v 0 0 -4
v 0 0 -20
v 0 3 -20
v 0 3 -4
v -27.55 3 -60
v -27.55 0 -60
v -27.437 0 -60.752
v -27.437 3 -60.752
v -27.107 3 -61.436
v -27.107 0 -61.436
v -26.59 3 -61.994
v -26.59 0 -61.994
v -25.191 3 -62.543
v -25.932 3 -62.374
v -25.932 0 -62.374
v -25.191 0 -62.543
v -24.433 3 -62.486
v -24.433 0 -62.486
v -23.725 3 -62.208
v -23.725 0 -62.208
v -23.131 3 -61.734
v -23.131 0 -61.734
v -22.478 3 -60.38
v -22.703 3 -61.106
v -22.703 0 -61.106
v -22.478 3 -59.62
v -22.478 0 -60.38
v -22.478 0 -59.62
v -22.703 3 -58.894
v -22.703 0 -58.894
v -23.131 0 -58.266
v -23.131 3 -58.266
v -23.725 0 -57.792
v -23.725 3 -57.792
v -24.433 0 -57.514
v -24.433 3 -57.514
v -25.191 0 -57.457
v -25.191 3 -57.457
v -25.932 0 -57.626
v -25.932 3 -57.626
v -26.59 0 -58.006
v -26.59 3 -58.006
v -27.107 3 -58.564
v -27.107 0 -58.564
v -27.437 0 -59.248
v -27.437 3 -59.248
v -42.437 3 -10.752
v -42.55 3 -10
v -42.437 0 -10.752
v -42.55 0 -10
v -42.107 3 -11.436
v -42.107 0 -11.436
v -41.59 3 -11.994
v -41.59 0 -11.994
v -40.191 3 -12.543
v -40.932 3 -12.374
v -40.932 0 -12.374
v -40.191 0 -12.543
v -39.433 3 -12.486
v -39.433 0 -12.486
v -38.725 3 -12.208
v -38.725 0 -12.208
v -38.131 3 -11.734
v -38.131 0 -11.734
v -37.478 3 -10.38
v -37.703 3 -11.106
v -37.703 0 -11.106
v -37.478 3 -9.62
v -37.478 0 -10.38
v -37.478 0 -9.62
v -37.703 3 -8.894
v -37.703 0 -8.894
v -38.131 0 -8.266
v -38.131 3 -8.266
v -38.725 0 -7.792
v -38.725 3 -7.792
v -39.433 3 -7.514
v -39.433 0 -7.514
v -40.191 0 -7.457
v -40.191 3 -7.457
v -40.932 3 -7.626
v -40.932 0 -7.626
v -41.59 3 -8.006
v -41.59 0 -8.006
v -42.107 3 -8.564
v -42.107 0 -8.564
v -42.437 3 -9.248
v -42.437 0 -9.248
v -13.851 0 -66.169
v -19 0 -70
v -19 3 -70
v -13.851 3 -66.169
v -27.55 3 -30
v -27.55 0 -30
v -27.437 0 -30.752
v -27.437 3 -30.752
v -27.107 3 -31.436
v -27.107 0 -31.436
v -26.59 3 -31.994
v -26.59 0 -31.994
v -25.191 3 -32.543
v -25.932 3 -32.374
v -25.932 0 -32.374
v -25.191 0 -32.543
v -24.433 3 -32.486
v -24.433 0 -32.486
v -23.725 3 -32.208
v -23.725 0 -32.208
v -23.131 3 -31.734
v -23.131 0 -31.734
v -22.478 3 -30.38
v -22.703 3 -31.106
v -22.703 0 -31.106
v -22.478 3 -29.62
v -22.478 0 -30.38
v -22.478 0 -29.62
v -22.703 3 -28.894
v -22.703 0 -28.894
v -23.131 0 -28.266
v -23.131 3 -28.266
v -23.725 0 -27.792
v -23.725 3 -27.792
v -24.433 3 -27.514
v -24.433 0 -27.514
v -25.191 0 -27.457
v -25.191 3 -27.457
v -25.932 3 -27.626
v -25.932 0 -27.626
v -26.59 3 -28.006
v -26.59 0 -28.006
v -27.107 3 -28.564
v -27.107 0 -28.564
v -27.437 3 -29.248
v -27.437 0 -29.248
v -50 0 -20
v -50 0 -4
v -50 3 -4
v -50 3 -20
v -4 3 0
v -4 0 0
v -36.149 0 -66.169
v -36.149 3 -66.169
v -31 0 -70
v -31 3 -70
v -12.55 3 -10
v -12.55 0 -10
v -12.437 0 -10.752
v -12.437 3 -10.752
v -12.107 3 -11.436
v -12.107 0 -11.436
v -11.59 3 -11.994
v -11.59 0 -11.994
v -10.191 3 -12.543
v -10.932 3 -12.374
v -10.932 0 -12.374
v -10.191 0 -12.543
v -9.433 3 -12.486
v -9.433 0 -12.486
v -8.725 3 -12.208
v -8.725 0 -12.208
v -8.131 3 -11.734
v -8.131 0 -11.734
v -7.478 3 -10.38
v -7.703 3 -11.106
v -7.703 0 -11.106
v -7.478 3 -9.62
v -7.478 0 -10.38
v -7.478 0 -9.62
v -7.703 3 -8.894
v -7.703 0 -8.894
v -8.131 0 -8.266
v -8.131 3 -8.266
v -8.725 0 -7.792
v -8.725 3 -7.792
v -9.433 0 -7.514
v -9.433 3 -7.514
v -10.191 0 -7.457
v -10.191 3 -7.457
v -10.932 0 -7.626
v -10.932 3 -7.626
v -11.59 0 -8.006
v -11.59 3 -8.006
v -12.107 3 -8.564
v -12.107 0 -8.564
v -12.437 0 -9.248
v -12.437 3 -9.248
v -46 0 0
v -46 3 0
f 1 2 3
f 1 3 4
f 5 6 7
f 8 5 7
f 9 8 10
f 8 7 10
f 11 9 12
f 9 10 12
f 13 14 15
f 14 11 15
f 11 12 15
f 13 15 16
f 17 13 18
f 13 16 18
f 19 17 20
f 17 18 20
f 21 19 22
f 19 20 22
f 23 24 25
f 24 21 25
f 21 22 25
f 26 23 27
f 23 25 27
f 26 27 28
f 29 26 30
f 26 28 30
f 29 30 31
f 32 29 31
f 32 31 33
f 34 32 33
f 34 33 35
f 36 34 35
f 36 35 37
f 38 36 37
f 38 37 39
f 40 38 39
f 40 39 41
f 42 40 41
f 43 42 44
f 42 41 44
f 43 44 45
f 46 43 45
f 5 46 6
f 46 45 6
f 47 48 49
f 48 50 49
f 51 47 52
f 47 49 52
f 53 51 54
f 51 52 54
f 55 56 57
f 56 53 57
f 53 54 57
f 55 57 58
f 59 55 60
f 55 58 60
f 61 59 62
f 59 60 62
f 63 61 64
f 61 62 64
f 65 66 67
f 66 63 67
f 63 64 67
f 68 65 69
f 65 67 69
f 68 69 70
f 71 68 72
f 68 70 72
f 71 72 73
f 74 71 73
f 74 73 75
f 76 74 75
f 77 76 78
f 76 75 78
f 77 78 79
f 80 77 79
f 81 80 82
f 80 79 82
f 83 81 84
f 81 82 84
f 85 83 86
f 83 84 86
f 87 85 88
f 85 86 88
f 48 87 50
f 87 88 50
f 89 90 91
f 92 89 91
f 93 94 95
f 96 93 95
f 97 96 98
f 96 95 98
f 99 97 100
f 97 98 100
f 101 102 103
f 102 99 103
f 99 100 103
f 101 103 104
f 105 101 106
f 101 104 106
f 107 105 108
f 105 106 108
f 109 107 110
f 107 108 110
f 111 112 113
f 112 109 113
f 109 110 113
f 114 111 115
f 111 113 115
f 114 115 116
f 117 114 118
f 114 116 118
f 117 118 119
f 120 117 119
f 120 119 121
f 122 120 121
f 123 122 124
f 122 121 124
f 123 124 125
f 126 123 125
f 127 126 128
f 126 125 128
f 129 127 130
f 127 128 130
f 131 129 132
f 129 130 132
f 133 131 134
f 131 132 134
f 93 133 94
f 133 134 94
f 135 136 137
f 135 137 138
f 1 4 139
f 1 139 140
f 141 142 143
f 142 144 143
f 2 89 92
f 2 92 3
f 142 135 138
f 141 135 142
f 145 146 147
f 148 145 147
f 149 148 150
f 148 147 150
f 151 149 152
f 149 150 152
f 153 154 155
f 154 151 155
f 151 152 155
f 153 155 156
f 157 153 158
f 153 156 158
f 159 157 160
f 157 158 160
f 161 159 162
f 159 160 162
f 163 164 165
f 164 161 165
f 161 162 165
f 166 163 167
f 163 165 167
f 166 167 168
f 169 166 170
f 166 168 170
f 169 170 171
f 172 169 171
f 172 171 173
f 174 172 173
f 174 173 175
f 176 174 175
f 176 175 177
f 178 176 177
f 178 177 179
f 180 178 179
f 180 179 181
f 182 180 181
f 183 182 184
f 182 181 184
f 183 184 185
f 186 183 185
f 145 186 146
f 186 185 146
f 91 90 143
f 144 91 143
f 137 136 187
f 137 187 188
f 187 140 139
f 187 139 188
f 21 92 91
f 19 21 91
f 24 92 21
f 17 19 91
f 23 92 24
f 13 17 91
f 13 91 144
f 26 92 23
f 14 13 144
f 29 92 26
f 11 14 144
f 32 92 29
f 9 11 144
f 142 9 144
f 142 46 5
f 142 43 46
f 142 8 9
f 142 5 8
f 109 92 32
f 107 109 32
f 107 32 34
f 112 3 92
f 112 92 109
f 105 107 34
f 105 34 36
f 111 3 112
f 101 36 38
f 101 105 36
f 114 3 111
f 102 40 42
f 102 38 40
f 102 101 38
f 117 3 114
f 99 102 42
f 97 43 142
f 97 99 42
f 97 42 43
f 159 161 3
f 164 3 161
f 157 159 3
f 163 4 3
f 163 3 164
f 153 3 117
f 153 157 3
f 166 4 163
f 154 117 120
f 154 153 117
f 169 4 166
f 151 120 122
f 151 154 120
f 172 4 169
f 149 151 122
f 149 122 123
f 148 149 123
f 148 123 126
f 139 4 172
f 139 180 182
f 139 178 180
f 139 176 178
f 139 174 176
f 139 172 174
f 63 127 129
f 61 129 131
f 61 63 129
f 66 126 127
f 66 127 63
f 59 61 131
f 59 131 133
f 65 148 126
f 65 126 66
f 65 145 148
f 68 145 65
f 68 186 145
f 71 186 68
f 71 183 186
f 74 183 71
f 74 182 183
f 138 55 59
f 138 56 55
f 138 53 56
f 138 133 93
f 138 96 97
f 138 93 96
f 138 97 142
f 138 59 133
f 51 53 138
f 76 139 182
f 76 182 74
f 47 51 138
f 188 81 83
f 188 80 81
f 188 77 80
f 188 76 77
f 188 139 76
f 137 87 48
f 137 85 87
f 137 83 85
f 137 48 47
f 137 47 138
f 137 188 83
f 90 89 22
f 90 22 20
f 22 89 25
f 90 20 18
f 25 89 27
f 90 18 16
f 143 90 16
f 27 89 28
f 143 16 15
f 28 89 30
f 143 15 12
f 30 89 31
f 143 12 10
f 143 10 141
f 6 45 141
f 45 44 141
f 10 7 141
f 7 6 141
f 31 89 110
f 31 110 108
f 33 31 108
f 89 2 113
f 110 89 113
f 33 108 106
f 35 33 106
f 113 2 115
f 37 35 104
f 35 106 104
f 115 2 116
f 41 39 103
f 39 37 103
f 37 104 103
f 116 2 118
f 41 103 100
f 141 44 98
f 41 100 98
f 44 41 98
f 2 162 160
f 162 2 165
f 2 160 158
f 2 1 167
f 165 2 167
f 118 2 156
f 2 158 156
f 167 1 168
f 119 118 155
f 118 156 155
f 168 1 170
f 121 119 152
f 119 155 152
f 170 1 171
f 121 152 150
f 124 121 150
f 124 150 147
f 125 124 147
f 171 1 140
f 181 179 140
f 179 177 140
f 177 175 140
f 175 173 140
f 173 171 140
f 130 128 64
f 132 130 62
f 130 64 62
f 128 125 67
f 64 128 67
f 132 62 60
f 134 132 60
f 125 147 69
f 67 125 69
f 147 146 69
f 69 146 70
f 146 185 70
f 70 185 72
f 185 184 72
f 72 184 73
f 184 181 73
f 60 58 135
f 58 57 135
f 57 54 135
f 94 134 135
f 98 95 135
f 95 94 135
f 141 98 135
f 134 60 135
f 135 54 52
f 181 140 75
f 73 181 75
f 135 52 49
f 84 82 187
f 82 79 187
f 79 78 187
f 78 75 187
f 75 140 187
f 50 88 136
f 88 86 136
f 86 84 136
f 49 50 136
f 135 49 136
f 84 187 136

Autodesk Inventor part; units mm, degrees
ref_plane "YZ Plane" through (0, 0, 0) normal (1, 0, 0) x (0, 1, 0)
ref_plane "XZ Plane" through (0, 0, 0) normal (0, 1, 0) x (-1, 0, 0)
ref_plane "XY Plane" through (0, 0, 0) normal (0, 0, 1) x (1, 0, 0)
sketch "草图1" plane through (0, 0, 0) normal (0, 1, 0) x (-1, 0, 0)
  line L0 (0, 0) -> (50, 0)
  line L1 (50, 0) -> (50, -20)
  line L2 (50, -20) -> (0, -20)
  line L3 (0, -20) -> (0, 0)
  line L4 (35, -20) -> (15, -20)
  line L5 (15, -20) -> (15, -70)
  line L6 (15, -70) -> (35, -70)
  line L7 (35, -70) -> (35, -20)
  line L8 (25, 0) -> (25, -7.1636)
  line L9 (50, -20) -> (35, -70)
  line L10 (15, -70) -> (0, -20)
  circle A0 centre (40, -10) radius 2.55
  circle A1 centre (10, -10) radius 2.55
  circle A2 centre (25, -30) radius 2.55
  circle A3 centre (25, -60) radius 2.55
  line L11 (50, -10) -> (45.4992, -10)
  dimension "d0" = 50
  dimension "d1" = 20
  dimension "d2" = 20
  dimension "d3" = 50
  dimension "d4" = 5.1
  dimension "d5" = 10
  dimension "d6" = 10
  dimension "d7" = 10
extrude "拉伸1" add sketch "草图1" along normal blind 3
chamfer "倒角1" distance 4 angle 45 2 edges at (0, 1.5, 0) (-50, 1.5, 0)
chamfer "倒角2" distance 4 angle 45 2 edges at (-15, 1.5, -70) (-35, 1.5, -70)
properties part number "body_fix2"
